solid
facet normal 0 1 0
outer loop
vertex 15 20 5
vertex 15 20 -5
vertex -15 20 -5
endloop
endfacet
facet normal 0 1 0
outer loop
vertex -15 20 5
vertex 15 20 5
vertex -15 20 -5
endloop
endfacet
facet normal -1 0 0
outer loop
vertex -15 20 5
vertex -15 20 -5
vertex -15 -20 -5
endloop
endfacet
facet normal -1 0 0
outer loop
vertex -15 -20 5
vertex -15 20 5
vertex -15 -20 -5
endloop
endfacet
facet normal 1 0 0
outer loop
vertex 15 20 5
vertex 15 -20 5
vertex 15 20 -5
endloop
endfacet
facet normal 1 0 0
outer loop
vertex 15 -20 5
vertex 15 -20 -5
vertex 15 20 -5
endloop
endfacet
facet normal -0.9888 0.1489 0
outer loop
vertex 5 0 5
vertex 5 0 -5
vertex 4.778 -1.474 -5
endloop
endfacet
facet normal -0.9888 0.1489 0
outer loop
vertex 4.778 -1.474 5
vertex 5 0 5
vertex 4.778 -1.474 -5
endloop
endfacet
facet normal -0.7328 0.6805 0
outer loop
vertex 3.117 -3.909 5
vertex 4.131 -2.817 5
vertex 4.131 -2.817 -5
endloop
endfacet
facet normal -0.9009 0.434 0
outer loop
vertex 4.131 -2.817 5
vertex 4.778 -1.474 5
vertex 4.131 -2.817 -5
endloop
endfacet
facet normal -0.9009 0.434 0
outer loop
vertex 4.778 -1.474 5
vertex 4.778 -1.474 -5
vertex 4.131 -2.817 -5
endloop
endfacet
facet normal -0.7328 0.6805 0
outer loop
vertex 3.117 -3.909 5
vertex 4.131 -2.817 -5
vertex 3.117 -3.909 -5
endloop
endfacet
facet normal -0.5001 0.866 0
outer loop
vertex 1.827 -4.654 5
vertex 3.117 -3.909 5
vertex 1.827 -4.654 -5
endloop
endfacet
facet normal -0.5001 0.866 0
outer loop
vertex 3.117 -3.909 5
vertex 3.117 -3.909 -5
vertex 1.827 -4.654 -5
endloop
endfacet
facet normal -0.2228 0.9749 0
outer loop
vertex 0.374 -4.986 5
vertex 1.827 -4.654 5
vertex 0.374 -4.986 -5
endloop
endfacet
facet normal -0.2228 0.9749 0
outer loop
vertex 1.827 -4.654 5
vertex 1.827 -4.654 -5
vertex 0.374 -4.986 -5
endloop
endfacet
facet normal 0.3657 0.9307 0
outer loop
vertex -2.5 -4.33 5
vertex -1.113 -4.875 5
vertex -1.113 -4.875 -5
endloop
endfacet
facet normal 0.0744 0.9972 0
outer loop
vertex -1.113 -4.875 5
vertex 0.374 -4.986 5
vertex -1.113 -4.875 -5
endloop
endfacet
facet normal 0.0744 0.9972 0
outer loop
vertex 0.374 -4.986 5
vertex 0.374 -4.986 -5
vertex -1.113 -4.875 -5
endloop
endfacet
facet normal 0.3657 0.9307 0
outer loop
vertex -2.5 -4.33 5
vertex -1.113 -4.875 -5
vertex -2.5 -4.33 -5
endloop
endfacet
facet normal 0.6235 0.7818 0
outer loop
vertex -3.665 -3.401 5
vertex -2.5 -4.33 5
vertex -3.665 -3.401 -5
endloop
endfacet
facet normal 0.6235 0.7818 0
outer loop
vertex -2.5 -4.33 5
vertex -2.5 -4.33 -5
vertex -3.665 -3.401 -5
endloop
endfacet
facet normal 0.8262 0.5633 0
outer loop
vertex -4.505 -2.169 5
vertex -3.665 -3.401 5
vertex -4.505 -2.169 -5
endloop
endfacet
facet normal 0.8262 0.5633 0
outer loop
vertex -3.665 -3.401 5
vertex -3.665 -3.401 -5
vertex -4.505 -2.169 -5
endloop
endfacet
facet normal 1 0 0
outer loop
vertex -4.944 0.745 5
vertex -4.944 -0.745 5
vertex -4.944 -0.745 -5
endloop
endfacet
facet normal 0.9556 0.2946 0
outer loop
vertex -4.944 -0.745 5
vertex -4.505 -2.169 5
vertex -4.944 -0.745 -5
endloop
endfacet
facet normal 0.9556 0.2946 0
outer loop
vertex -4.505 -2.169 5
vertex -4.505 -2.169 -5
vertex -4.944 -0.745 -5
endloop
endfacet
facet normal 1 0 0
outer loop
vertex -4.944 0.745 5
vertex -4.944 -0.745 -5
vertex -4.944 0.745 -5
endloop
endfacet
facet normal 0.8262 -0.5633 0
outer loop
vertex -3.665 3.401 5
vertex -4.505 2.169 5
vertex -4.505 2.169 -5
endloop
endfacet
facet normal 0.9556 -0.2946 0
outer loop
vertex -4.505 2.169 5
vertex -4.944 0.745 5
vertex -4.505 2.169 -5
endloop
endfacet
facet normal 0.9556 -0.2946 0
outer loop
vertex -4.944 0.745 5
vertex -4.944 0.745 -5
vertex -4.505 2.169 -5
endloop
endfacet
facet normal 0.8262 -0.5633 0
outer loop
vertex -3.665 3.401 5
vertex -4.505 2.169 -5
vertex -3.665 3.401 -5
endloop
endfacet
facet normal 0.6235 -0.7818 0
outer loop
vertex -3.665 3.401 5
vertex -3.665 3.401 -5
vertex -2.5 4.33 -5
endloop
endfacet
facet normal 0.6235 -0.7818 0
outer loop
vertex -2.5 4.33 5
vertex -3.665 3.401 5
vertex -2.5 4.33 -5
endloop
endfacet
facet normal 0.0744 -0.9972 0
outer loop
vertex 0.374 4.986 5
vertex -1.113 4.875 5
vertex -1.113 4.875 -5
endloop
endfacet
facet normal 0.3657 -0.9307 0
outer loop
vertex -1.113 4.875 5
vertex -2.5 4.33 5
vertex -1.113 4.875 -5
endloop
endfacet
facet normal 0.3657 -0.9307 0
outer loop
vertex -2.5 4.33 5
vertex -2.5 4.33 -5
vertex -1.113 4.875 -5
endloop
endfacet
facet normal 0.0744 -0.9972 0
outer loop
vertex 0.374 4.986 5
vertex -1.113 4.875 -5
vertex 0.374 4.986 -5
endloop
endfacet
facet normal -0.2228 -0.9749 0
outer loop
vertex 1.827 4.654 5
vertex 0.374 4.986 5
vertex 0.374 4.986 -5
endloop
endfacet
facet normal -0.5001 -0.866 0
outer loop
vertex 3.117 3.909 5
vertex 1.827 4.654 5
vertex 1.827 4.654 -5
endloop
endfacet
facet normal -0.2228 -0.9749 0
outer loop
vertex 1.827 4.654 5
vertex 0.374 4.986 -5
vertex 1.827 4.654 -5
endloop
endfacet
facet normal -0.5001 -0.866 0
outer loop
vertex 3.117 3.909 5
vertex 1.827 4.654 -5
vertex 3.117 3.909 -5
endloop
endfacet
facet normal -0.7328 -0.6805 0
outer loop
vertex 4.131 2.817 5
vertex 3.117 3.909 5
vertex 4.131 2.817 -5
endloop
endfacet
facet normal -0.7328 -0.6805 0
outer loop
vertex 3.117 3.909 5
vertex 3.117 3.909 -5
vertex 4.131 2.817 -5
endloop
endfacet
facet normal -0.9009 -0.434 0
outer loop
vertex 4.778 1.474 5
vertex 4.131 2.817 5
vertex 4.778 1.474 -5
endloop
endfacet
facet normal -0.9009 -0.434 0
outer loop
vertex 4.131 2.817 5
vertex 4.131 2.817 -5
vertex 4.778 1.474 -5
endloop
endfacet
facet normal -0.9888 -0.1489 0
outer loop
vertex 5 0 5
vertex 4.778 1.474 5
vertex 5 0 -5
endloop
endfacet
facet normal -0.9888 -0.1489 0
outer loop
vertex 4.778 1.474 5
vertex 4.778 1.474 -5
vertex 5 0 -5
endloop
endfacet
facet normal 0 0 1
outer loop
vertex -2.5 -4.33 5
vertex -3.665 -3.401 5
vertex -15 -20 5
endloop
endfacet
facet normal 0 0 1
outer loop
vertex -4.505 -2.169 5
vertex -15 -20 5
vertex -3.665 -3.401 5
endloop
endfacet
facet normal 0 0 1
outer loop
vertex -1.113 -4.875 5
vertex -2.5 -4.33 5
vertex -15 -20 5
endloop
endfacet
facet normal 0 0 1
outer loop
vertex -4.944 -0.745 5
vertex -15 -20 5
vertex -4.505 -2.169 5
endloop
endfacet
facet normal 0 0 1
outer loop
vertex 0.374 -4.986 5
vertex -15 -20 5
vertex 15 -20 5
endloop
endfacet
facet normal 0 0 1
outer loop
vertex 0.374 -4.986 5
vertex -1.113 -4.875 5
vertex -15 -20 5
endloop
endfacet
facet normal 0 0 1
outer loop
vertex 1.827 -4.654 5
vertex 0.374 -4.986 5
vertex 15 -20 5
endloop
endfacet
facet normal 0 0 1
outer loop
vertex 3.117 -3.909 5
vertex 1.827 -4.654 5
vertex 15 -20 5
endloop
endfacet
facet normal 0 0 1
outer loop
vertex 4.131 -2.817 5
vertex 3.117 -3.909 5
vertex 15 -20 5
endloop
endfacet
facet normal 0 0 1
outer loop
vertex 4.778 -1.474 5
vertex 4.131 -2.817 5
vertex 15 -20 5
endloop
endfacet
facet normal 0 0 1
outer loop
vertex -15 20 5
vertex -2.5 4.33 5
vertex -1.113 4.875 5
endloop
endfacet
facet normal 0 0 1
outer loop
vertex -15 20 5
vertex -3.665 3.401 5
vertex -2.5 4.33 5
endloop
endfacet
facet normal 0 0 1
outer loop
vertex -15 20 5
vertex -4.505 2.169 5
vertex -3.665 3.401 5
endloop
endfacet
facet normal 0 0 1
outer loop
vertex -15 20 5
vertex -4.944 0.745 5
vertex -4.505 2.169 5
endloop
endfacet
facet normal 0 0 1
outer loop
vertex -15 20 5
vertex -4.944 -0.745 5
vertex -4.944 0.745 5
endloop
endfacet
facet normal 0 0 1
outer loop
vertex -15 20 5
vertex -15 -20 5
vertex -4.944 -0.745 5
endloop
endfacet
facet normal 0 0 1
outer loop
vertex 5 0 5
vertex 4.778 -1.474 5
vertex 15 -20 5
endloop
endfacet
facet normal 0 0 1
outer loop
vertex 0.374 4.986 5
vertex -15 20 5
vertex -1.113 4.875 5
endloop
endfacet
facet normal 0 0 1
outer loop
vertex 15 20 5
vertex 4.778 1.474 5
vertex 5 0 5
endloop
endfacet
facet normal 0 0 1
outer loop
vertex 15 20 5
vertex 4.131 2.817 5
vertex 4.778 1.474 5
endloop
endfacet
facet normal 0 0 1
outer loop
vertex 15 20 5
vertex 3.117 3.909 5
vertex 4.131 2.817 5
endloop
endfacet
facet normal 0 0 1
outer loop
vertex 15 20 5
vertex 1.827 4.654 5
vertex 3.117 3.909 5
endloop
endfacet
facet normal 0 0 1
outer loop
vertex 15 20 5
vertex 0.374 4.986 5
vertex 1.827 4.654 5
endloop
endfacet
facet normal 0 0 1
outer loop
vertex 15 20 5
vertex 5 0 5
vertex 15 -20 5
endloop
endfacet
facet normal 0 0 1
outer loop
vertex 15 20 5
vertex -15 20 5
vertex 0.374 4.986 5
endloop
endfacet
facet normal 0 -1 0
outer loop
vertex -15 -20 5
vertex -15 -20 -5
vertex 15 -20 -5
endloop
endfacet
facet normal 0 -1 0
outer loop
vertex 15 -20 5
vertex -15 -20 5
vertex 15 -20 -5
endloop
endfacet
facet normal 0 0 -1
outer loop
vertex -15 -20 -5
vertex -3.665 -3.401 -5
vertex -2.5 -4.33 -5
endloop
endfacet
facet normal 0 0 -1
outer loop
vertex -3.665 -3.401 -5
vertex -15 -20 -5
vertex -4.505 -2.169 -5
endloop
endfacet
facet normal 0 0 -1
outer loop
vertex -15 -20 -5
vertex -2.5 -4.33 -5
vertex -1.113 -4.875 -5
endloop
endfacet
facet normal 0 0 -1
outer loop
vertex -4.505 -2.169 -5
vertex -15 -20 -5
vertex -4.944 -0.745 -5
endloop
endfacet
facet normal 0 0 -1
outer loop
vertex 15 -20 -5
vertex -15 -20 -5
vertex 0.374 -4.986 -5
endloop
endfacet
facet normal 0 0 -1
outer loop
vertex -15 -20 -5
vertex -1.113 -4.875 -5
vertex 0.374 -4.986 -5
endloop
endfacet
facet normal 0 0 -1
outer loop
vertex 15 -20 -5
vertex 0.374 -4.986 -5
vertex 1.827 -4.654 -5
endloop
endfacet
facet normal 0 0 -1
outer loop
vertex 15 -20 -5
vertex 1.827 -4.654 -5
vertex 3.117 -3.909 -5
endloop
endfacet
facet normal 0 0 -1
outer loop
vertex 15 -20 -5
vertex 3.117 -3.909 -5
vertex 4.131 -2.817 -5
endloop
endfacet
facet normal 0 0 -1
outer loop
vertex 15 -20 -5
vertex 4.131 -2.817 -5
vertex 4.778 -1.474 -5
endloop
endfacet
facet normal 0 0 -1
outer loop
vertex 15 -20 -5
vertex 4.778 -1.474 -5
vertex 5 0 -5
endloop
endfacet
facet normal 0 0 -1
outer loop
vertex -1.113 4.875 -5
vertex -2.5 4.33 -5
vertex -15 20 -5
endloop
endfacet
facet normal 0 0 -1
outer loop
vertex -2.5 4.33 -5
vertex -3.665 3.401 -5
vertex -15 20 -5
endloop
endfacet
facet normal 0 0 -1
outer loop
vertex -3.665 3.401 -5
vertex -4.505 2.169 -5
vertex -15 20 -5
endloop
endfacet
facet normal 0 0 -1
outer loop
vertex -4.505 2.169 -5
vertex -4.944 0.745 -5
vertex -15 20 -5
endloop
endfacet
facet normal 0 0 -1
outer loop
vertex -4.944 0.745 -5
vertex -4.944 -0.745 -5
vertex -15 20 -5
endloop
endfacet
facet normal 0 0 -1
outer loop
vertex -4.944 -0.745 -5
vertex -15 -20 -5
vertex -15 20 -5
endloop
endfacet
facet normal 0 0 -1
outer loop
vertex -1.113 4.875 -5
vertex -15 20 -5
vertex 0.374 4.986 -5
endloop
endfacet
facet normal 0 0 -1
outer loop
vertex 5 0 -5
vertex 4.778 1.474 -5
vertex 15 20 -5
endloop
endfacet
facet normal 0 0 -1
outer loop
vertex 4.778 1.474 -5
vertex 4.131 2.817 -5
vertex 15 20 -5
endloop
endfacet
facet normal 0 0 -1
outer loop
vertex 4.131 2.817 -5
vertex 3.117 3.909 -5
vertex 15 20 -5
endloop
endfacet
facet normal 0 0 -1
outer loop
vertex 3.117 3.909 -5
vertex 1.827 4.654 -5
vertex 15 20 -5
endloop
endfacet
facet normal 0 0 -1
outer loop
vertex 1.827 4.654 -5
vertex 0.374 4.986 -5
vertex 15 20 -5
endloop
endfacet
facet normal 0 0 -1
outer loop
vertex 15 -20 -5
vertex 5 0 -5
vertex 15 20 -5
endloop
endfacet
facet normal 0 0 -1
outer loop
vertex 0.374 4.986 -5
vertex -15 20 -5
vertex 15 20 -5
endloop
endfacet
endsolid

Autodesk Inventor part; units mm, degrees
ref_plane "YZ Plane" through (0, 0, 0) normal (1, 0, 0) x (0, 1, 0)
ref_plane "XZ Plane" through (0, 0, 0) normal (0, 1, 0) x (-1, 0, 0)
ref_plane "XY Plane" through (0, 0, 0) normal (0, 0, 1) x (1, 0, 0)
sketch "Sketch1" plane through (0, 0, 0) normal (0, 0, 1) x (1, 0, 0)
  circle A0 centre (0, 0) radius 5
  line L0 (-15, -20) -> (15, -20)
  line L1 (15, -20) -> (15, 20)
  line L2 (15, 20) -> (-15, 20)
  line L3 (-15, 20) -> (-15, -20)
  line L4 (-15, -20) -> (15, 20) construction
  line L5 (15, -20) -> (-15, 20) construction
  dimension "d0" = 10
  dimension "d1" = 30
  dimension "d2" = 40
extrude "Extrusion1" add sketch "Sketch1" along normal mid plane 10
properties part number "Corredera" material "Stainless Steel"
